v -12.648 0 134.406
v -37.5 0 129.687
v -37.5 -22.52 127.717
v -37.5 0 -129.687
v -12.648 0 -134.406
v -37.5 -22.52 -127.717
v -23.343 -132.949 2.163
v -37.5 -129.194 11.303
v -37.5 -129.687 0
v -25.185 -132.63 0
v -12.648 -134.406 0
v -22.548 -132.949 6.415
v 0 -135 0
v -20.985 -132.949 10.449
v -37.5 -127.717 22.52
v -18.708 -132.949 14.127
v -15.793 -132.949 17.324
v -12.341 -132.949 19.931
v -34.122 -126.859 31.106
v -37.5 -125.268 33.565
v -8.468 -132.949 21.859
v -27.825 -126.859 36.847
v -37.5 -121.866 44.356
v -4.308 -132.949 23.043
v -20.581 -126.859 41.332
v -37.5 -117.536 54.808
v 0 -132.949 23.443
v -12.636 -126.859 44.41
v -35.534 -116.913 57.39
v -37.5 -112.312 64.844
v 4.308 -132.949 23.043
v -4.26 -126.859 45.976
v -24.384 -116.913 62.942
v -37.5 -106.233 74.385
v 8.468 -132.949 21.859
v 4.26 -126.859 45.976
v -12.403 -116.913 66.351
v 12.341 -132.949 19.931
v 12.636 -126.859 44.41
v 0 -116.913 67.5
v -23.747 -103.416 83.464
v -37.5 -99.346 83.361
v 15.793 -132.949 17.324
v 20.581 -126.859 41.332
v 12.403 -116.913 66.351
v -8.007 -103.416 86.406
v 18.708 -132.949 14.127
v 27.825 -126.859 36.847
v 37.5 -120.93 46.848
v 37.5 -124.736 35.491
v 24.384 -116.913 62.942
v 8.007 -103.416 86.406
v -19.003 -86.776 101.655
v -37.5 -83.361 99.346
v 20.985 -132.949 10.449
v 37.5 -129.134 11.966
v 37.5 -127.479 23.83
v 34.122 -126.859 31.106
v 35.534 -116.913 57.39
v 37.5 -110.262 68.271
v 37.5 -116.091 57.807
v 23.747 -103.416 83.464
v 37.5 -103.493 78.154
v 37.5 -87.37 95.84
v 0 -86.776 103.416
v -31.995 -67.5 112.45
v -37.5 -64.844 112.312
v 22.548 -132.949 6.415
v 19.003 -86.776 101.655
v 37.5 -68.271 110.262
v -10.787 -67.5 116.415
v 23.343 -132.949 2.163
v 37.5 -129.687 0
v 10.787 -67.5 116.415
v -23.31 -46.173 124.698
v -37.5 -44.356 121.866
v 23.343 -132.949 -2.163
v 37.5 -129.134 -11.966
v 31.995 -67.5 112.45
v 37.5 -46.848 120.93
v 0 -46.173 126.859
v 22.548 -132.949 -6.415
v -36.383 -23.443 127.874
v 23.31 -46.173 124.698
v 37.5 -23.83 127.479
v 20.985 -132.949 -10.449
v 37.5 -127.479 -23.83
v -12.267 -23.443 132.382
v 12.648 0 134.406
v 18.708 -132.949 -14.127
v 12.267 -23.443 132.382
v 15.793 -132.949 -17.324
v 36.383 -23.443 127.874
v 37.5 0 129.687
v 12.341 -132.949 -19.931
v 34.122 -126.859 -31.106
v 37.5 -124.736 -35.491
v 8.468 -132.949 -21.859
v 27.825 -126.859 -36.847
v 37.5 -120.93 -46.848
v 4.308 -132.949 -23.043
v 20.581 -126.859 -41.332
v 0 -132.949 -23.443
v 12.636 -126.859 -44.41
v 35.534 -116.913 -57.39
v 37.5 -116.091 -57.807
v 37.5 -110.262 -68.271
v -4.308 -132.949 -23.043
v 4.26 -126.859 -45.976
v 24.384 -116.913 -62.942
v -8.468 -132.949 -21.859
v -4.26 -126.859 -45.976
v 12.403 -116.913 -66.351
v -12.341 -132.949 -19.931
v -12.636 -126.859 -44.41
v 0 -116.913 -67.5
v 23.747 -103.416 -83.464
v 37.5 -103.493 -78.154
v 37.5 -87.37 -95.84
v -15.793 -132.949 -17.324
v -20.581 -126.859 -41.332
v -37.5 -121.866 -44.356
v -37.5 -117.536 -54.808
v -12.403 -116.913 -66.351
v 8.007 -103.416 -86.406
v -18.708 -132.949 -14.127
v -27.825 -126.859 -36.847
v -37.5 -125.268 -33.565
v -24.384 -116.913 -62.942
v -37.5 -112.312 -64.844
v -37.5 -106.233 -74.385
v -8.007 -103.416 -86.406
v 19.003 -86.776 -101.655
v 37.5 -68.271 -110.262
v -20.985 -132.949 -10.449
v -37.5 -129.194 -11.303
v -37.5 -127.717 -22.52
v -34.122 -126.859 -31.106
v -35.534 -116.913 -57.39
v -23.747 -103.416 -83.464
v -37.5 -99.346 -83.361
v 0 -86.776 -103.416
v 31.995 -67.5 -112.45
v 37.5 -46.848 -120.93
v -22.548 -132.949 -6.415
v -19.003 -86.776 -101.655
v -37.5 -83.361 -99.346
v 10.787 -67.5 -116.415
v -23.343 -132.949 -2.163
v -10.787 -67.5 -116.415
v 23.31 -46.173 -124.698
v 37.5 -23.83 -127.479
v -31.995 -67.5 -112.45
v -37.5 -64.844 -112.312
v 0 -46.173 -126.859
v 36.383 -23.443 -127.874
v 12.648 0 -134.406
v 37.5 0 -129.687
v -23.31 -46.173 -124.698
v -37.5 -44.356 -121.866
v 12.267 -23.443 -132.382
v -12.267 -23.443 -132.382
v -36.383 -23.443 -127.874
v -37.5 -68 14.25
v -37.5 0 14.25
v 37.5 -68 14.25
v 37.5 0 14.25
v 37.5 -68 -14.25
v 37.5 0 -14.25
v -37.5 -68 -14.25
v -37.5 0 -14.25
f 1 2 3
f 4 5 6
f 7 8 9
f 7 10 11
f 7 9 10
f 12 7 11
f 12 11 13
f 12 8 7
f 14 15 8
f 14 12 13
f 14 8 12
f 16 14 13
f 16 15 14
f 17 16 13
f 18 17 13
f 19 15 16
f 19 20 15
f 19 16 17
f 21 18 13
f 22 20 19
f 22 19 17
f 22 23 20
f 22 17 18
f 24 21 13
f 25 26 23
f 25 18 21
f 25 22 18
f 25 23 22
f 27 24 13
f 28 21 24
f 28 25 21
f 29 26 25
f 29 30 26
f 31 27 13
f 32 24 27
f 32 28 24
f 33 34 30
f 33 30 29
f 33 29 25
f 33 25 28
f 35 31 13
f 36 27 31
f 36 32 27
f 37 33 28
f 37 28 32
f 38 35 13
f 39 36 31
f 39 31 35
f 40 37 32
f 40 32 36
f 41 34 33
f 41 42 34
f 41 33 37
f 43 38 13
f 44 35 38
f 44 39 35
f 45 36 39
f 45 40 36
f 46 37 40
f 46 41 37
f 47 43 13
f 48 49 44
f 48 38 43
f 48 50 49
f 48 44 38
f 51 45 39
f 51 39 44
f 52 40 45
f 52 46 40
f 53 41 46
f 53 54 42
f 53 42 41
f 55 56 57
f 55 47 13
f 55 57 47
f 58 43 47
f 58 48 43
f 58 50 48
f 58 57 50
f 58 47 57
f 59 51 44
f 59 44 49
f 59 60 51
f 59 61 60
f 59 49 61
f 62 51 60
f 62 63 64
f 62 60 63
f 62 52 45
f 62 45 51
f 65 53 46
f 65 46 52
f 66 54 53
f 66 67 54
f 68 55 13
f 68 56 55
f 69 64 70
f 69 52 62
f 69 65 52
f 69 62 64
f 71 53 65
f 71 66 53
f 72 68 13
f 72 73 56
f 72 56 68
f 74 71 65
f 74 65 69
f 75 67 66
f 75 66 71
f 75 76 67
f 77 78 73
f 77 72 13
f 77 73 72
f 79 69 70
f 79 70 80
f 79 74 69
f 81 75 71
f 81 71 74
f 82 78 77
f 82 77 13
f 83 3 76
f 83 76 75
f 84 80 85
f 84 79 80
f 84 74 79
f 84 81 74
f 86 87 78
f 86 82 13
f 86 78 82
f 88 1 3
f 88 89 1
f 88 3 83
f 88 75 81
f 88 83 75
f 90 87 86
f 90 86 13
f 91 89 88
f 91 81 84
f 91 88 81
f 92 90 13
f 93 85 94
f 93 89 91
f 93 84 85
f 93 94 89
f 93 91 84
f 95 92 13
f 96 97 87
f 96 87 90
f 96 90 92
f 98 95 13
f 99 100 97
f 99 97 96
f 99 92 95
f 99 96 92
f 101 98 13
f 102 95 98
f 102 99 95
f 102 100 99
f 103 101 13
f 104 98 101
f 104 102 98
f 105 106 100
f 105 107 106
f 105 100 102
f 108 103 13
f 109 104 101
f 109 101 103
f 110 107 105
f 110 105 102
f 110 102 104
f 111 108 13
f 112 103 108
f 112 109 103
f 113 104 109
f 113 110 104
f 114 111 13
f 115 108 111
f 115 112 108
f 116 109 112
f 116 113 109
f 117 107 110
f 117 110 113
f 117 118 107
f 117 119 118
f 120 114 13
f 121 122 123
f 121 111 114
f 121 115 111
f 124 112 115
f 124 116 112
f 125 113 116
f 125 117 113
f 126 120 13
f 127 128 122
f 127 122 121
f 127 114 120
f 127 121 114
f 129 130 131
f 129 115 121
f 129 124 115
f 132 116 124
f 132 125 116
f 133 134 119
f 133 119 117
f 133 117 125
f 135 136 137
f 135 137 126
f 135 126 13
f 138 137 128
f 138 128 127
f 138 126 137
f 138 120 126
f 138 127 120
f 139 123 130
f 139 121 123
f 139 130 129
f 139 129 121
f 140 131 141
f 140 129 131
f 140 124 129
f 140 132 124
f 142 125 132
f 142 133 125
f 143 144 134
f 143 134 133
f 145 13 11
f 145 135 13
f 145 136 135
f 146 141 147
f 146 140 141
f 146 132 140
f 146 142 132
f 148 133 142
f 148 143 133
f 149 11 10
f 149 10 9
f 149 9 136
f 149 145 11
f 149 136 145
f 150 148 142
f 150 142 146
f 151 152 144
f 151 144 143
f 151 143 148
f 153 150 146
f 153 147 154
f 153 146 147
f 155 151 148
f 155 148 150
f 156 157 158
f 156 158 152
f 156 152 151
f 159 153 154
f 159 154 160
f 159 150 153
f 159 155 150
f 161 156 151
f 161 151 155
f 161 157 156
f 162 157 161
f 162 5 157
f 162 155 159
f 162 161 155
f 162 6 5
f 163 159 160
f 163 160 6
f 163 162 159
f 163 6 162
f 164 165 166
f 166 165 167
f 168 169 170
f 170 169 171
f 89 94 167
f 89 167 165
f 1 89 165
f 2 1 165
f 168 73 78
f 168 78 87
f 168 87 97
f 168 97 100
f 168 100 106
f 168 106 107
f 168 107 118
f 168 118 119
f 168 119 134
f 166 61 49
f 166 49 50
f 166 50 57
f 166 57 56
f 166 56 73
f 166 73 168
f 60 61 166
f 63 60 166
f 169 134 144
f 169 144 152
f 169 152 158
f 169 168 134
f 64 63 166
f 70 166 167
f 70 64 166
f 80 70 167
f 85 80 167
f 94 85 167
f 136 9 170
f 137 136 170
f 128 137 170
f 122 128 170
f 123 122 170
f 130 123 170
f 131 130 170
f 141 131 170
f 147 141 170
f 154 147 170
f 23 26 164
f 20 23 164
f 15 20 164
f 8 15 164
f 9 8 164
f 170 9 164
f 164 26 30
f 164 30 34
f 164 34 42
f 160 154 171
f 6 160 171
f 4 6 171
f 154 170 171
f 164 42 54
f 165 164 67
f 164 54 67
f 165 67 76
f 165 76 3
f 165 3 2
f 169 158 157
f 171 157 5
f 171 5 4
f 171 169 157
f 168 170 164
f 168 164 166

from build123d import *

# Parameters (mm, degrees)
CUT_EXTRUDE2_DEPTH = 331.681115276
SKETCH3_W          = 75
SKETCH3_H          = 28.5
CUT_EXTRUDE3_DEPTH = 68


with BuildPart() as part:
    # Sketch1 → Revolve2 (revolve)
    with BuildSketch(Plane.XY):
        with BuildLine():
            Line((135, 0), (0, 0))
            Line((0, 0), (0, -135))
            ThreePointArc((0, -135), (95.45941546, -95.45941546), (135, 0))
        make_face()
    revolve(axis=Axis((0, 0, 0), (0, 1, 0)))

    # Sketch2 → Cut-Extrude2 (cut, through all)
    with BuildSketch(Plane.XY.offset(135)):
        with BuildLine():
            Line((-37.5, -129.687123493), (-37.5, 0))
            Line((-37.5, 0), (0, 0))
            Line((0, 0), (37.5, 0))
            Line((37.5, 0), (37.5, -129.687123493))
            ThreePointArc((37.5, -129.687123493), (107.906209275, -81.124903698), (135, 0))
            ThreePointArc((135, 0), (-81.124903698, 107.906209275), (-37.5, -129.687123493))
        make_face()
    extrude(amount=-CUT_EXTRUDE2_DEPTH, mode=Mode.SUBTRACT)

    # Sketch3 → Cut-Extrude3 (cut)
    with BuildSketch(Plane(origin=(0, 0, 0), x_dir=(1, 0, 0), z_dir=(0, 1, 0))):
        Rectangle(SKETCH3_W, SKETCH3_H)
    extrude(amount=-CUT_EXTRUDE3_DEPTH, mode=Mode.SUBTRACT)


solid = part.part
